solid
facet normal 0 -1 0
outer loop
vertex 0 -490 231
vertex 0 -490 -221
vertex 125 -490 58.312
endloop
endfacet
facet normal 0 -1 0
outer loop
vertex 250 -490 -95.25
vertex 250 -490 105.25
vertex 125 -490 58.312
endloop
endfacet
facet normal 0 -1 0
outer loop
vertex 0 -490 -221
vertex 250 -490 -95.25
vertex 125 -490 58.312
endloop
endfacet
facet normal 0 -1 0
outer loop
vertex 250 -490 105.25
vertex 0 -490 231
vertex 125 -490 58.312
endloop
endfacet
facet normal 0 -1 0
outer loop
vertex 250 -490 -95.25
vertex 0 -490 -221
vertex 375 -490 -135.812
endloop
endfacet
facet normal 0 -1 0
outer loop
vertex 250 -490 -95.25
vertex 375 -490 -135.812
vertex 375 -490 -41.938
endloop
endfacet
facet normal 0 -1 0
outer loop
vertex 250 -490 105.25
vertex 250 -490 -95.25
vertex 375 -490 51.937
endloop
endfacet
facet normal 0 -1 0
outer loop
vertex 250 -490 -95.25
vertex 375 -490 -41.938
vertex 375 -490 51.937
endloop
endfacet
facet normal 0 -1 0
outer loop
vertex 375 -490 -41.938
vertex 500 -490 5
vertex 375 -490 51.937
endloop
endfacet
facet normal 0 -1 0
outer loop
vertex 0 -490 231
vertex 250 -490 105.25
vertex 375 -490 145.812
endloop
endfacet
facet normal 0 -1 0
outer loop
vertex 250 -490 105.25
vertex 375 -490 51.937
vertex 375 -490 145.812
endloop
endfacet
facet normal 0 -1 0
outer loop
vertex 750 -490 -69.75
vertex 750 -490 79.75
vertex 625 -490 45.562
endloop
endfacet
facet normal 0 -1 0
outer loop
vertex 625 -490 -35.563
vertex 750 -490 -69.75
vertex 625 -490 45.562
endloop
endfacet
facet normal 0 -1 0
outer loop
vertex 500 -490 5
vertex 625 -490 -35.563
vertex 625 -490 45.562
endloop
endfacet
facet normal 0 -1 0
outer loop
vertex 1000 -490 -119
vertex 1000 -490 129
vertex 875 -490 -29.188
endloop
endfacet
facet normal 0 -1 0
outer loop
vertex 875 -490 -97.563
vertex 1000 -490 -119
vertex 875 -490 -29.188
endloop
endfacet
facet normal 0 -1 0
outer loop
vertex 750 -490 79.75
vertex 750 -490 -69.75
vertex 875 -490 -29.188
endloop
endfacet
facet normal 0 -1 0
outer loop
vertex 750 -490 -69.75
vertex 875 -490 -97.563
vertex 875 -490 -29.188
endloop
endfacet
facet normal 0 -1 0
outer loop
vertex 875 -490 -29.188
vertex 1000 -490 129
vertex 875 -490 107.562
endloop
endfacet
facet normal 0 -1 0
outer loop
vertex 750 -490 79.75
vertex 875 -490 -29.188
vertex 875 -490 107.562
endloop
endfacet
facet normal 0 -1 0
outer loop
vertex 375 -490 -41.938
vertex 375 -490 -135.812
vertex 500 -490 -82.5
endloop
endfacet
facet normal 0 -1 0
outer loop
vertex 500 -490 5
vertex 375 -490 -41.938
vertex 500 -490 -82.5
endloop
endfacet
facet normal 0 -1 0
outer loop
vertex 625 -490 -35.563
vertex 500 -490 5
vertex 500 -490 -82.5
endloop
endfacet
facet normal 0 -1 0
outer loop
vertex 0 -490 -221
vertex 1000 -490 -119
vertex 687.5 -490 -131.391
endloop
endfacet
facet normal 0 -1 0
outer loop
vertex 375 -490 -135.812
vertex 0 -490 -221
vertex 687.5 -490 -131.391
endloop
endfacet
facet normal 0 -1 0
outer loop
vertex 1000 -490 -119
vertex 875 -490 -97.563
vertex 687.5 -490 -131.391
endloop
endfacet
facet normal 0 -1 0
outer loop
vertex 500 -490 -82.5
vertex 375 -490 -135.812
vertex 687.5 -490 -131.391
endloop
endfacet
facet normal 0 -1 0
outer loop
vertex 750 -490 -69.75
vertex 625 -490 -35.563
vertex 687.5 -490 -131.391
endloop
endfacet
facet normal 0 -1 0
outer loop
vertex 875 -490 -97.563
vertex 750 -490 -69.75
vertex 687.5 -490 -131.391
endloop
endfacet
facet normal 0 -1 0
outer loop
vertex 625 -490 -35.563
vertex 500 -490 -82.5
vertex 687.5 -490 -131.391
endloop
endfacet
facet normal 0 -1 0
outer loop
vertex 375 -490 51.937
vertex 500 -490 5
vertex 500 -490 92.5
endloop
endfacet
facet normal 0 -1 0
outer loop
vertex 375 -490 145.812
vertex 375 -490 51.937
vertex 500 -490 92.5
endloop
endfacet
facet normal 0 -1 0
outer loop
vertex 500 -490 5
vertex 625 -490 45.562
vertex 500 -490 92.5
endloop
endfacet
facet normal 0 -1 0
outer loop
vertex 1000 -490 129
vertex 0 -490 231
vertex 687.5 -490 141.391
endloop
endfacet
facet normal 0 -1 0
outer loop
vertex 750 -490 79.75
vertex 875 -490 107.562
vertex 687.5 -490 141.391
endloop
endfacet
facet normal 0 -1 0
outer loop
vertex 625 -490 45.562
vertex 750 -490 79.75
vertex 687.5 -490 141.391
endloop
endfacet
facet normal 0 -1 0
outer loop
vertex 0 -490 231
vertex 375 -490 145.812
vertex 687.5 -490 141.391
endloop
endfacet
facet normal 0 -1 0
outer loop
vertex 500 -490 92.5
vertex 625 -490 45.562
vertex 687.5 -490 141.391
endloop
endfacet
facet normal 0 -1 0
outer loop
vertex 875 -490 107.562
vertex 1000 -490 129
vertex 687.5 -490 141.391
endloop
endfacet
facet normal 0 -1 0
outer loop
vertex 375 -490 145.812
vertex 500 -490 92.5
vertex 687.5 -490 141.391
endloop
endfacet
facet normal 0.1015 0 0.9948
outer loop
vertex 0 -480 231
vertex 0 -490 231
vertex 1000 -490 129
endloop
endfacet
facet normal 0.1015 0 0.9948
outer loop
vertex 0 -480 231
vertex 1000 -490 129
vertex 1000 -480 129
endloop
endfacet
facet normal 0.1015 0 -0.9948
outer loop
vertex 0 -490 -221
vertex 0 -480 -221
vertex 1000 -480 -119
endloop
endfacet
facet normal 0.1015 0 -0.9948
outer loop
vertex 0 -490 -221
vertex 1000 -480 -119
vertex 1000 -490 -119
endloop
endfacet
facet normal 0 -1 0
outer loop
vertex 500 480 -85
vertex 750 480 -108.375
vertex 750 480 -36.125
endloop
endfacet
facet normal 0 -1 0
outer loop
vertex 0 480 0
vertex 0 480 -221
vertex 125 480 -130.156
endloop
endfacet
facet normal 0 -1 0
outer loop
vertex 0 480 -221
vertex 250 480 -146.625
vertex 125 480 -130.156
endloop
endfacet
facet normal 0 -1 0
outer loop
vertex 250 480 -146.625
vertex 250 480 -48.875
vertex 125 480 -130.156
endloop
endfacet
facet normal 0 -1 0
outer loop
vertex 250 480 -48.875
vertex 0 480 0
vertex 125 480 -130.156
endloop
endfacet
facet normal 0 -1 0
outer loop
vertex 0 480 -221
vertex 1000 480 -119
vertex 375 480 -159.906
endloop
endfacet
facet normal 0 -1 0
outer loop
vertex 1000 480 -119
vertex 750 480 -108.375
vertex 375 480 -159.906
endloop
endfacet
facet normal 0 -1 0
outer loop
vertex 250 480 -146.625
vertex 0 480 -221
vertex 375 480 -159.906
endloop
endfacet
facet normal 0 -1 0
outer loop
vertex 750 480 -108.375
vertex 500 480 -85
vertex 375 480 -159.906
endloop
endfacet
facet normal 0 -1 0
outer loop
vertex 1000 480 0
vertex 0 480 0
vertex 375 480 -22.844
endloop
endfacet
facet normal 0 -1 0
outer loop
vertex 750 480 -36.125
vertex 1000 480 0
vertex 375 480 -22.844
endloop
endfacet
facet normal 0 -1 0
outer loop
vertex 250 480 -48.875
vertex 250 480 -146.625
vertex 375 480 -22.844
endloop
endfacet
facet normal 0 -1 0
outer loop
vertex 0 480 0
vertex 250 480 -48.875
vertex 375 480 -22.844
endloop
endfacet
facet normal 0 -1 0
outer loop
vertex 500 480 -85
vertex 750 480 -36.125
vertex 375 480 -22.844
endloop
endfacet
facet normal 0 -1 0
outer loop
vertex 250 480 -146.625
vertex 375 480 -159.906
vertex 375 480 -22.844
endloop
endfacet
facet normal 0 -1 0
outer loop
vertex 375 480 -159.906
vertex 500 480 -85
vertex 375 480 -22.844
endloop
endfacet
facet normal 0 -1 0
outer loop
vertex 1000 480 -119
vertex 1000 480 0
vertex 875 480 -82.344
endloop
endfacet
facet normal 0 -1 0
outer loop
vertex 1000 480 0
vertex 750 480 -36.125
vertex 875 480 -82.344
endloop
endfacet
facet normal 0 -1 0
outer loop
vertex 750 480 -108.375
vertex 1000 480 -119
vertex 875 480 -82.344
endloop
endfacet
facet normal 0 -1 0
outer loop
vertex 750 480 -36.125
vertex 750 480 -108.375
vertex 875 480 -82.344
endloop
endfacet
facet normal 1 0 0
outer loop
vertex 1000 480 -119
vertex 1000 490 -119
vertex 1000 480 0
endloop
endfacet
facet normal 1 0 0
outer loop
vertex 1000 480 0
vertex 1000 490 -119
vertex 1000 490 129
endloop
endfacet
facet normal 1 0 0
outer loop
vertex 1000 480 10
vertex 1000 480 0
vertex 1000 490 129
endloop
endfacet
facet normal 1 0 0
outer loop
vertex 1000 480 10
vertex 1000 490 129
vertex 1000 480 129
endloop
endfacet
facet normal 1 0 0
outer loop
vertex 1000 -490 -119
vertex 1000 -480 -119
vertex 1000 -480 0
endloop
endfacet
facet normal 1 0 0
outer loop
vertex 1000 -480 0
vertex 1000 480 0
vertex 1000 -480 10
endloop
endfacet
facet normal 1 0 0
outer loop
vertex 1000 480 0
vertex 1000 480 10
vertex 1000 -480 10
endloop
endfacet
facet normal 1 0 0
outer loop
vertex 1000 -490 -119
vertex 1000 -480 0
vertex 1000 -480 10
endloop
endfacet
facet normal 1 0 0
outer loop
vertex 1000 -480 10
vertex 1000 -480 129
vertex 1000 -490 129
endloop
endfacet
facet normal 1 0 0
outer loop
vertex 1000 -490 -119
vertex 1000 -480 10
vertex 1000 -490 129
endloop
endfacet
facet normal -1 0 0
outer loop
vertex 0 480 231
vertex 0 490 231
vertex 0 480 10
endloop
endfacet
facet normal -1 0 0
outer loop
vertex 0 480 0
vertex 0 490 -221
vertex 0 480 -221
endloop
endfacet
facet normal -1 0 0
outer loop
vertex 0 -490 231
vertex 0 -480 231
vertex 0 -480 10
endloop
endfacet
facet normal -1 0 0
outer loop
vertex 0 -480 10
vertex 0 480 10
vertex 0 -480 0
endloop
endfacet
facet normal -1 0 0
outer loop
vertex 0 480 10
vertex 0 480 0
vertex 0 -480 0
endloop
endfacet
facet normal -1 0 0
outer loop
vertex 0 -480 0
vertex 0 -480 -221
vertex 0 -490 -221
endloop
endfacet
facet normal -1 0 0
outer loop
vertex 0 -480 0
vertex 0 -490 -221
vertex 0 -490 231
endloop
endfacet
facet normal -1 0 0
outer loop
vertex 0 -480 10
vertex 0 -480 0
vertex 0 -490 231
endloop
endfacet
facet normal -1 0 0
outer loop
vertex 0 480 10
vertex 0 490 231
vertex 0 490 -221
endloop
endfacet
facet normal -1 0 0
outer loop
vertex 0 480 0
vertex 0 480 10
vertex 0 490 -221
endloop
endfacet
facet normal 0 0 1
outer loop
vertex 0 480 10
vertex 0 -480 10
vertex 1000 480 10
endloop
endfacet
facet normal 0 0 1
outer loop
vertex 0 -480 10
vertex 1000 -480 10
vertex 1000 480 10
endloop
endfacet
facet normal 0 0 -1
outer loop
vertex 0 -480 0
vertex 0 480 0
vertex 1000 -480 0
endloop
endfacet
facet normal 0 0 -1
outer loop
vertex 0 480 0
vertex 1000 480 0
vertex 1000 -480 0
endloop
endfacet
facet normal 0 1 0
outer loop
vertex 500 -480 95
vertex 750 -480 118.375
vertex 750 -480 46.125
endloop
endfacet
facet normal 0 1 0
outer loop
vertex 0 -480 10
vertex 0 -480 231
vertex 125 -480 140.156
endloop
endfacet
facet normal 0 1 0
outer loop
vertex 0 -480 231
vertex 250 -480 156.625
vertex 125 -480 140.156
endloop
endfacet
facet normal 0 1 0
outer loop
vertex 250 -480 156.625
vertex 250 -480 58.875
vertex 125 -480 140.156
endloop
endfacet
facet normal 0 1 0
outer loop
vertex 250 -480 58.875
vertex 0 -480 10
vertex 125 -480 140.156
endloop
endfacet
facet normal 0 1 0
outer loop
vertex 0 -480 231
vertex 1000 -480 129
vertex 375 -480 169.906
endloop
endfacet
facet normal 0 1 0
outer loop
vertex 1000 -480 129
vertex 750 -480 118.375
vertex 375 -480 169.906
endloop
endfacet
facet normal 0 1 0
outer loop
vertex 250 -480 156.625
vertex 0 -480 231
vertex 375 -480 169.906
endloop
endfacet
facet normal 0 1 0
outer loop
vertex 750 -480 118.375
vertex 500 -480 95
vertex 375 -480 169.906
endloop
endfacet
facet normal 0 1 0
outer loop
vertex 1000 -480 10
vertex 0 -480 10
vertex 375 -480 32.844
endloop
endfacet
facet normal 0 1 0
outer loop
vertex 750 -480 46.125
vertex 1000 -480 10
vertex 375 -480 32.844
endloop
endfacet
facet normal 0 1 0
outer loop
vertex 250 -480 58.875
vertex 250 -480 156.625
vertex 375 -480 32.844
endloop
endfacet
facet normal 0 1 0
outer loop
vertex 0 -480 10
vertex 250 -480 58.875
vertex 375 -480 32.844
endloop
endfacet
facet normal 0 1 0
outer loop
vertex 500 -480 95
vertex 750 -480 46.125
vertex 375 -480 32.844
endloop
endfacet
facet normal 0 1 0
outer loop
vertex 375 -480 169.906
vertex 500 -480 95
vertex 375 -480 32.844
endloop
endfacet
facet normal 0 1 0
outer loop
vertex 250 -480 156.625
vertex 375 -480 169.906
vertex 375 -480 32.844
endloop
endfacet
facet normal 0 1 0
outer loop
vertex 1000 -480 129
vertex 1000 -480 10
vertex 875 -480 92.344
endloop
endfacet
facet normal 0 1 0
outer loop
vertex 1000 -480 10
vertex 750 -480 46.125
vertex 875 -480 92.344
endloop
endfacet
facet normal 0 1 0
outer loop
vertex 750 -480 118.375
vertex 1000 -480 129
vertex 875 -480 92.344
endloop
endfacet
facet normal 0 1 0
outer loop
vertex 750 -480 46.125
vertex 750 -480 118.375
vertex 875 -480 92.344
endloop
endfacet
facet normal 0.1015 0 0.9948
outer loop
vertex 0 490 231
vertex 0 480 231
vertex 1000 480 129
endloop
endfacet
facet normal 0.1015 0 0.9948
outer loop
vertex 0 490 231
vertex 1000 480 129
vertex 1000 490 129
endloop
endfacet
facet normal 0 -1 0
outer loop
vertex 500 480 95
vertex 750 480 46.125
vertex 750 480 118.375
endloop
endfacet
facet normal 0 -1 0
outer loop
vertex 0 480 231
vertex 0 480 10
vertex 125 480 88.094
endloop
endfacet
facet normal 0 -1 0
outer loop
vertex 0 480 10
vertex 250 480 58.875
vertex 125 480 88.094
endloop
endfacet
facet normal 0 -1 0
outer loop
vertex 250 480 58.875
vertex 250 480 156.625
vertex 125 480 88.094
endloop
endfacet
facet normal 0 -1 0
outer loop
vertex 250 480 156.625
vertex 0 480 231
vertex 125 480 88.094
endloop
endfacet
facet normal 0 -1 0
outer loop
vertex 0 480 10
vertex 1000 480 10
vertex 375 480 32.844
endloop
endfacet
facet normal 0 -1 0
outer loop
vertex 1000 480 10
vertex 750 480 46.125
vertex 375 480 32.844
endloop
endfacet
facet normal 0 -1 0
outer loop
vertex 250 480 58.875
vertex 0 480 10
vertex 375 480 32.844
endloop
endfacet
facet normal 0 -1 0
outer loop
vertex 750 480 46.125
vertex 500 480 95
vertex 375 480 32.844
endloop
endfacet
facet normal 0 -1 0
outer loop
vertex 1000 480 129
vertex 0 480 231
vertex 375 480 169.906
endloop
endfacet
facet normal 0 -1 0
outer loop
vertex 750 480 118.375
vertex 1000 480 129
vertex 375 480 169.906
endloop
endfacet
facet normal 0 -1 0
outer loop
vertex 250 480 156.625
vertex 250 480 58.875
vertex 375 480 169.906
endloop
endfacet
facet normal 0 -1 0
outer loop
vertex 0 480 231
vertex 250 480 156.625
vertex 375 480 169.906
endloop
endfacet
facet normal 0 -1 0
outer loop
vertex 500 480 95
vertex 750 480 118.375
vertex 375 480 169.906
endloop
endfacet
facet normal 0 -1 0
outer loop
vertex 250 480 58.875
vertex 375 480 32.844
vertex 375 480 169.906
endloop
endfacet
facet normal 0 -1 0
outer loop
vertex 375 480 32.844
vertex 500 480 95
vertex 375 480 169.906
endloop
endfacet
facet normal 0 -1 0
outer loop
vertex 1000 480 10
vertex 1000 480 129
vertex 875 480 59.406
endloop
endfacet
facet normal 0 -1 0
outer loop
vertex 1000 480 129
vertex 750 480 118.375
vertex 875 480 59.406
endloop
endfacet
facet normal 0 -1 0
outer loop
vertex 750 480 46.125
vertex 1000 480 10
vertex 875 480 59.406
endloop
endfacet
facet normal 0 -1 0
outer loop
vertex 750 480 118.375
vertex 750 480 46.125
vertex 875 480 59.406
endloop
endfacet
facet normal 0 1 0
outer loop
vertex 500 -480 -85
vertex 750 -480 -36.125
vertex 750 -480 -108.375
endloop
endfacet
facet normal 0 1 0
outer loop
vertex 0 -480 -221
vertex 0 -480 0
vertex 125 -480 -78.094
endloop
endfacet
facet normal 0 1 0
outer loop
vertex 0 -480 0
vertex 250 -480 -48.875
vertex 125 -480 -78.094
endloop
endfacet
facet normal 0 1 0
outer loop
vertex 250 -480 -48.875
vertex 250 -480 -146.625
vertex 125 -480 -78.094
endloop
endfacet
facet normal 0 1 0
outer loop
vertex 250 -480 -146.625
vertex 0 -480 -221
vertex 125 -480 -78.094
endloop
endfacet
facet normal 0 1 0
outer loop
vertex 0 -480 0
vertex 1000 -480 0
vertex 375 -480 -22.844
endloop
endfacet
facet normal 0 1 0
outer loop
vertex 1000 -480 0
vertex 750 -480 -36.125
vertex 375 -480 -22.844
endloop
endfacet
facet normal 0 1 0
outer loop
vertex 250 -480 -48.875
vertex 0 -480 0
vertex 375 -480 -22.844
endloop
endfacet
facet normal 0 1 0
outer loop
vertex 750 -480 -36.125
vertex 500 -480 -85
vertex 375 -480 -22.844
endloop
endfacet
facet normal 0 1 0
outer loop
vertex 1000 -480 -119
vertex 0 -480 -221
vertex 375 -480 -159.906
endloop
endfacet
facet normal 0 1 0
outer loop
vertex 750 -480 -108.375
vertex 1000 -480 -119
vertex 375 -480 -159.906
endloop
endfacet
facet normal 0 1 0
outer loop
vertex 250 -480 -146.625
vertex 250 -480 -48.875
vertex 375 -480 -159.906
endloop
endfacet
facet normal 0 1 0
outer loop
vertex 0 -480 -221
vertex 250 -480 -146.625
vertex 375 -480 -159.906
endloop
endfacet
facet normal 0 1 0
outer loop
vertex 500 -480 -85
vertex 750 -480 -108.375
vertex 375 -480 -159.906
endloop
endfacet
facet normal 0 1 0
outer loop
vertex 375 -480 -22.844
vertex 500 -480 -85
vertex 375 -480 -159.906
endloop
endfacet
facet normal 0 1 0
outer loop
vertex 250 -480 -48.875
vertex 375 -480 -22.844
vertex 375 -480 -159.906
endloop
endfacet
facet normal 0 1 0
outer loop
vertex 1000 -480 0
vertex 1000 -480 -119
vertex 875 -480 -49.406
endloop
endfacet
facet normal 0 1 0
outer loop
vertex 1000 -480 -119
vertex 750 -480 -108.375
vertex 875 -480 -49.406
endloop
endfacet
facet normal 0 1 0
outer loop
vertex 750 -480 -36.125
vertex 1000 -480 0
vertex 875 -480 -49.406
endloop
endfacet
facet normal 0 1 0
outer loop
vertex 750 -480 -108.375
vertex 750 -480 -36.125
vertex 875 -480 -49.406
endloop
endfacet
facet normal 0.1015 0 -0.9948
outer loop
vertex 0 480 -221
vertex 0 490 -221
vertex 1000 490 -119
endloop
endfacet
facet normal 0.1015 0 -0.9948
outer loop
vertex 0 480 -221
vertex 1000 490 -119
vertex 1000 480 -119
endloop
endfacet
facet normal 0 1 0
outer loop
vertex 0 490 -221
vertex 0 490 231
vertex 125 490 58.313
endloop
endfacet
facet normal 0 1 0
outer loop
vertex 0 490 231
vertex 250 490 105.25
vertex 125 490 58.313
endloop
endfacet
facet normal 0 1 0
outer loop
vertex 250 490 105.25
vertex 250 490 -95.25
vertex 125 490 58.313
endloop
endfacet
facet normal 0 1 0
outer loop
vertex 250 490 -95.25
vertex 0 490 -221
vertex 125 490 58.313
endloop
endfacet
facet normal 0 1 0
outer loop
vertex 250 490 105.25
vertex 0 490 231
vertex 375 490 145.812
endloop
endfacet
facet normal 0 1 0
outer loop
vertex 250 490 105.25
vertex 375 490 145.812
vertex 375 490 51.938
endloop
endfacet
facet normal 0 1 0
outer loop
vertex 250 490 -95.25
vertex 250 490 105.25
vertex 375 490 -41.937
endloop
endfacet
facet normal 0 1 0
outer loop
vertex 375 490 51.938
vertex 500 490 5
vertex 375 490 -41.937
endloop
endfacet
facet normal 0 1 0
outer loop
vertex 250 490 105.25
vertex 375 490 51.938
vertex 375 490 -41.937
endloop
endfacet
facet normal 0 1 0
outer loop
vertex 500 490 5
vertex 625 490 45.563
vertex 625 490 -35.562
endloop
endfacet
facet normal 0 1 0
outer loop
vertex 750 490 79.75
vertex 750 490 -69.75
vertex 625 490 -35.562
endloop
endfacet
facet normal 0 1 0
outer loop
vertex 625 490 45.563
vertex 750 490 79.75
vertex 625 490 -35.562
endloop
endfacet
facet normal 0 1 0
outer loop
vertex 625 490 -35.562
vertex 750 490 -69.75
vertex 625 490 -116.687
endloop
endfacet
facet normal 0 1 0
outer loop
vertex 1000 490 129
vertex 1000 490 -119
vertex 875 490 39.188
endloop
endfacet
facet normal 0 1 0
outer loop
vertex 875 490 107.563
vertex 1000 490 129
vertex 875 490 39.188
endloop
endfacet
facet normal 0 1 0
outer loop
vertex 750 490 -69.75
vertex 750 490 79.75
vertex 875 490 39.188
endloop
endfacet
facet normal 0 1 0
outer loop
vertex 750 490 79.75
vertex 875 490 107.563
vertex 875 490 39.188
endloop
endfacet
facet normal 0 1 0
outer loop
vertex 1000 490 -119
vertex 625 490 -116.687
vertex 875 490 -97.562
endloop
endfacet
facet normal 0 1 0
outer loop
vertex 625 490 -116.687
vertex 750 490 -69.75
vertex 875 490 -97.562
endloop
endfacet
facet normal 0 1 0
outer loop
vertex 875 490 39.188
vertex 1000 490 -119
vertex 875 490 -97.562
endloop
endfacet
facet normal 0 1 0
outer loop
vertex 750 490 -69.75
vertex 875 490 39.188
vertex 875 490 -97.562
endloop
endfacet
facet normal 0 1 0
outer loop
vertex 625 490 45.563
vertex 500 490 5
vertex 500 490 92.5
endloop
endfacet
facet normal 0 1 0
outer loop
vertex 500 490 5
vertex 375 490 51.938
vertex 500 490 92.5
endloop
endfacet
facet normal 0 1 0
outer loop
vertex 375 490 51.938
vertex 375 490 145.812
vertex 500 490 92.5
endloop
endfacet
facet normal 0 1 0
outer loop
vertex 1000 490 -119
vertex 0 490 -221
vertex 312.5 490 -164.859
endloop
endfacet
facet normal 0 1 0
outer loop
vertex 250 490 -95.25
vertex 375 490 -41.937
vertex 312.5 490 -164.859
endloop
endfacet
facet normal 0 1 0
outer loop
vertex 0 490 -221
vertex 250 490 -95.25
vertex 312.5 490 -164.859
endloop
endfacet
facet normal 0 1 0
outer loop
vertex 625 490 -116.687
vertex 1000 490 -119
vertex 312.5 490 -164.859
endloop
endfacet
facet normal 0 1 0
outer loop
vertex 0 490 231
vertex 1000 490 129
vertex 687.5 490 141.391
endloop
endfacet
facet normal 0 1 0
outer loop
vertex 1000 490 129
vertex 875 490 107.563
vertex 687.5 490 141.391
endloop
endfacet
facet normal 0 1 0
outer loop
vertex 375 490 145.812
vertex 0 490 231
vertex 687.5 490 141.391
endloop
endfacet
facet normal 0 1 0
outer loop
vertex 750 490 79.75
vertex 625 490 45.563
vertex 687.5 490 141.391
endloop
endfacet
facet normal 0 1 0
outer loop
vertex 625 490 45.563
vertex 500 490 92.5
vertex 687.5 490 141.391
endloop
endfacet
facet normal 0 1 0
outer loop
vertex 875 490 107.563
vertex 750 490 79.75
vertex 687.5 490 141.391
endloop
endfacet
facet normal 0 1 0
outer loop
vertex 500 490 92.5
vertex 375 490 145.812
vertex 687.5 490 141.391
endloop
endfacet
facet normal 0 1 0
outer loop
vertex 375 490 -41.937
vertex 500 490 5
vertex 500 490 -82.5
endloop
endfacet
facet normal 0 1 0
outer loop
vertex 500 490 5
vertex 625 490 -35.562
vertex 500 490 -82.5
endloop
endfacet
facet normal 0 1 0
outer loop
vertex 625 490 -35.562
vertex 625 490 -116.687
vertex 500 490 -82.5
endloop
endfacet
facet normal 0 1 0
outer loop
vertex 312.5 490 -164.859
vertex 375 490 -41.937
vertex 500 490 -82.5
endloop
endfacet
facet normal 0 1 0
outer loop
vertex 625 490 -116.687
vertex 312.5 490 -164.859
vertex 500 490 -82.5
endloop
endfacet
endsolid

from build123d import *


with BuildPart() as part:
    # Sketch1 → Loft l2 section 0
    with BuildSketch(Plane(origin=(0, 0, 0), x_dir=(0, 0, -1), z_dir=(1, 0, 0))):
        Polygon((-231, 490), (221, 490), (221, 480), (0, 480), (0, -480), (221, -480), (221, -490), (-231, -490), (-231, -480), (-10, -480), (-10, 480), (-231, 480), align=None)
    # Sketch4 → Loft l2 section 1
    with BuildSketch(Plane(origin=(1000, 0, -1000), x_dir=(0, 0, 1), z_dir=(-1, 0, 0))):
        Polygon((881, 490), (1129, 490), (1129, 480), (1010, 480), (1010, -480), (1129, -480), (1129, -490), (881, -490), (881, -480), (1000, -480), (1000, 480), (881, 480), align=None)
    loft()


solid = part.part
